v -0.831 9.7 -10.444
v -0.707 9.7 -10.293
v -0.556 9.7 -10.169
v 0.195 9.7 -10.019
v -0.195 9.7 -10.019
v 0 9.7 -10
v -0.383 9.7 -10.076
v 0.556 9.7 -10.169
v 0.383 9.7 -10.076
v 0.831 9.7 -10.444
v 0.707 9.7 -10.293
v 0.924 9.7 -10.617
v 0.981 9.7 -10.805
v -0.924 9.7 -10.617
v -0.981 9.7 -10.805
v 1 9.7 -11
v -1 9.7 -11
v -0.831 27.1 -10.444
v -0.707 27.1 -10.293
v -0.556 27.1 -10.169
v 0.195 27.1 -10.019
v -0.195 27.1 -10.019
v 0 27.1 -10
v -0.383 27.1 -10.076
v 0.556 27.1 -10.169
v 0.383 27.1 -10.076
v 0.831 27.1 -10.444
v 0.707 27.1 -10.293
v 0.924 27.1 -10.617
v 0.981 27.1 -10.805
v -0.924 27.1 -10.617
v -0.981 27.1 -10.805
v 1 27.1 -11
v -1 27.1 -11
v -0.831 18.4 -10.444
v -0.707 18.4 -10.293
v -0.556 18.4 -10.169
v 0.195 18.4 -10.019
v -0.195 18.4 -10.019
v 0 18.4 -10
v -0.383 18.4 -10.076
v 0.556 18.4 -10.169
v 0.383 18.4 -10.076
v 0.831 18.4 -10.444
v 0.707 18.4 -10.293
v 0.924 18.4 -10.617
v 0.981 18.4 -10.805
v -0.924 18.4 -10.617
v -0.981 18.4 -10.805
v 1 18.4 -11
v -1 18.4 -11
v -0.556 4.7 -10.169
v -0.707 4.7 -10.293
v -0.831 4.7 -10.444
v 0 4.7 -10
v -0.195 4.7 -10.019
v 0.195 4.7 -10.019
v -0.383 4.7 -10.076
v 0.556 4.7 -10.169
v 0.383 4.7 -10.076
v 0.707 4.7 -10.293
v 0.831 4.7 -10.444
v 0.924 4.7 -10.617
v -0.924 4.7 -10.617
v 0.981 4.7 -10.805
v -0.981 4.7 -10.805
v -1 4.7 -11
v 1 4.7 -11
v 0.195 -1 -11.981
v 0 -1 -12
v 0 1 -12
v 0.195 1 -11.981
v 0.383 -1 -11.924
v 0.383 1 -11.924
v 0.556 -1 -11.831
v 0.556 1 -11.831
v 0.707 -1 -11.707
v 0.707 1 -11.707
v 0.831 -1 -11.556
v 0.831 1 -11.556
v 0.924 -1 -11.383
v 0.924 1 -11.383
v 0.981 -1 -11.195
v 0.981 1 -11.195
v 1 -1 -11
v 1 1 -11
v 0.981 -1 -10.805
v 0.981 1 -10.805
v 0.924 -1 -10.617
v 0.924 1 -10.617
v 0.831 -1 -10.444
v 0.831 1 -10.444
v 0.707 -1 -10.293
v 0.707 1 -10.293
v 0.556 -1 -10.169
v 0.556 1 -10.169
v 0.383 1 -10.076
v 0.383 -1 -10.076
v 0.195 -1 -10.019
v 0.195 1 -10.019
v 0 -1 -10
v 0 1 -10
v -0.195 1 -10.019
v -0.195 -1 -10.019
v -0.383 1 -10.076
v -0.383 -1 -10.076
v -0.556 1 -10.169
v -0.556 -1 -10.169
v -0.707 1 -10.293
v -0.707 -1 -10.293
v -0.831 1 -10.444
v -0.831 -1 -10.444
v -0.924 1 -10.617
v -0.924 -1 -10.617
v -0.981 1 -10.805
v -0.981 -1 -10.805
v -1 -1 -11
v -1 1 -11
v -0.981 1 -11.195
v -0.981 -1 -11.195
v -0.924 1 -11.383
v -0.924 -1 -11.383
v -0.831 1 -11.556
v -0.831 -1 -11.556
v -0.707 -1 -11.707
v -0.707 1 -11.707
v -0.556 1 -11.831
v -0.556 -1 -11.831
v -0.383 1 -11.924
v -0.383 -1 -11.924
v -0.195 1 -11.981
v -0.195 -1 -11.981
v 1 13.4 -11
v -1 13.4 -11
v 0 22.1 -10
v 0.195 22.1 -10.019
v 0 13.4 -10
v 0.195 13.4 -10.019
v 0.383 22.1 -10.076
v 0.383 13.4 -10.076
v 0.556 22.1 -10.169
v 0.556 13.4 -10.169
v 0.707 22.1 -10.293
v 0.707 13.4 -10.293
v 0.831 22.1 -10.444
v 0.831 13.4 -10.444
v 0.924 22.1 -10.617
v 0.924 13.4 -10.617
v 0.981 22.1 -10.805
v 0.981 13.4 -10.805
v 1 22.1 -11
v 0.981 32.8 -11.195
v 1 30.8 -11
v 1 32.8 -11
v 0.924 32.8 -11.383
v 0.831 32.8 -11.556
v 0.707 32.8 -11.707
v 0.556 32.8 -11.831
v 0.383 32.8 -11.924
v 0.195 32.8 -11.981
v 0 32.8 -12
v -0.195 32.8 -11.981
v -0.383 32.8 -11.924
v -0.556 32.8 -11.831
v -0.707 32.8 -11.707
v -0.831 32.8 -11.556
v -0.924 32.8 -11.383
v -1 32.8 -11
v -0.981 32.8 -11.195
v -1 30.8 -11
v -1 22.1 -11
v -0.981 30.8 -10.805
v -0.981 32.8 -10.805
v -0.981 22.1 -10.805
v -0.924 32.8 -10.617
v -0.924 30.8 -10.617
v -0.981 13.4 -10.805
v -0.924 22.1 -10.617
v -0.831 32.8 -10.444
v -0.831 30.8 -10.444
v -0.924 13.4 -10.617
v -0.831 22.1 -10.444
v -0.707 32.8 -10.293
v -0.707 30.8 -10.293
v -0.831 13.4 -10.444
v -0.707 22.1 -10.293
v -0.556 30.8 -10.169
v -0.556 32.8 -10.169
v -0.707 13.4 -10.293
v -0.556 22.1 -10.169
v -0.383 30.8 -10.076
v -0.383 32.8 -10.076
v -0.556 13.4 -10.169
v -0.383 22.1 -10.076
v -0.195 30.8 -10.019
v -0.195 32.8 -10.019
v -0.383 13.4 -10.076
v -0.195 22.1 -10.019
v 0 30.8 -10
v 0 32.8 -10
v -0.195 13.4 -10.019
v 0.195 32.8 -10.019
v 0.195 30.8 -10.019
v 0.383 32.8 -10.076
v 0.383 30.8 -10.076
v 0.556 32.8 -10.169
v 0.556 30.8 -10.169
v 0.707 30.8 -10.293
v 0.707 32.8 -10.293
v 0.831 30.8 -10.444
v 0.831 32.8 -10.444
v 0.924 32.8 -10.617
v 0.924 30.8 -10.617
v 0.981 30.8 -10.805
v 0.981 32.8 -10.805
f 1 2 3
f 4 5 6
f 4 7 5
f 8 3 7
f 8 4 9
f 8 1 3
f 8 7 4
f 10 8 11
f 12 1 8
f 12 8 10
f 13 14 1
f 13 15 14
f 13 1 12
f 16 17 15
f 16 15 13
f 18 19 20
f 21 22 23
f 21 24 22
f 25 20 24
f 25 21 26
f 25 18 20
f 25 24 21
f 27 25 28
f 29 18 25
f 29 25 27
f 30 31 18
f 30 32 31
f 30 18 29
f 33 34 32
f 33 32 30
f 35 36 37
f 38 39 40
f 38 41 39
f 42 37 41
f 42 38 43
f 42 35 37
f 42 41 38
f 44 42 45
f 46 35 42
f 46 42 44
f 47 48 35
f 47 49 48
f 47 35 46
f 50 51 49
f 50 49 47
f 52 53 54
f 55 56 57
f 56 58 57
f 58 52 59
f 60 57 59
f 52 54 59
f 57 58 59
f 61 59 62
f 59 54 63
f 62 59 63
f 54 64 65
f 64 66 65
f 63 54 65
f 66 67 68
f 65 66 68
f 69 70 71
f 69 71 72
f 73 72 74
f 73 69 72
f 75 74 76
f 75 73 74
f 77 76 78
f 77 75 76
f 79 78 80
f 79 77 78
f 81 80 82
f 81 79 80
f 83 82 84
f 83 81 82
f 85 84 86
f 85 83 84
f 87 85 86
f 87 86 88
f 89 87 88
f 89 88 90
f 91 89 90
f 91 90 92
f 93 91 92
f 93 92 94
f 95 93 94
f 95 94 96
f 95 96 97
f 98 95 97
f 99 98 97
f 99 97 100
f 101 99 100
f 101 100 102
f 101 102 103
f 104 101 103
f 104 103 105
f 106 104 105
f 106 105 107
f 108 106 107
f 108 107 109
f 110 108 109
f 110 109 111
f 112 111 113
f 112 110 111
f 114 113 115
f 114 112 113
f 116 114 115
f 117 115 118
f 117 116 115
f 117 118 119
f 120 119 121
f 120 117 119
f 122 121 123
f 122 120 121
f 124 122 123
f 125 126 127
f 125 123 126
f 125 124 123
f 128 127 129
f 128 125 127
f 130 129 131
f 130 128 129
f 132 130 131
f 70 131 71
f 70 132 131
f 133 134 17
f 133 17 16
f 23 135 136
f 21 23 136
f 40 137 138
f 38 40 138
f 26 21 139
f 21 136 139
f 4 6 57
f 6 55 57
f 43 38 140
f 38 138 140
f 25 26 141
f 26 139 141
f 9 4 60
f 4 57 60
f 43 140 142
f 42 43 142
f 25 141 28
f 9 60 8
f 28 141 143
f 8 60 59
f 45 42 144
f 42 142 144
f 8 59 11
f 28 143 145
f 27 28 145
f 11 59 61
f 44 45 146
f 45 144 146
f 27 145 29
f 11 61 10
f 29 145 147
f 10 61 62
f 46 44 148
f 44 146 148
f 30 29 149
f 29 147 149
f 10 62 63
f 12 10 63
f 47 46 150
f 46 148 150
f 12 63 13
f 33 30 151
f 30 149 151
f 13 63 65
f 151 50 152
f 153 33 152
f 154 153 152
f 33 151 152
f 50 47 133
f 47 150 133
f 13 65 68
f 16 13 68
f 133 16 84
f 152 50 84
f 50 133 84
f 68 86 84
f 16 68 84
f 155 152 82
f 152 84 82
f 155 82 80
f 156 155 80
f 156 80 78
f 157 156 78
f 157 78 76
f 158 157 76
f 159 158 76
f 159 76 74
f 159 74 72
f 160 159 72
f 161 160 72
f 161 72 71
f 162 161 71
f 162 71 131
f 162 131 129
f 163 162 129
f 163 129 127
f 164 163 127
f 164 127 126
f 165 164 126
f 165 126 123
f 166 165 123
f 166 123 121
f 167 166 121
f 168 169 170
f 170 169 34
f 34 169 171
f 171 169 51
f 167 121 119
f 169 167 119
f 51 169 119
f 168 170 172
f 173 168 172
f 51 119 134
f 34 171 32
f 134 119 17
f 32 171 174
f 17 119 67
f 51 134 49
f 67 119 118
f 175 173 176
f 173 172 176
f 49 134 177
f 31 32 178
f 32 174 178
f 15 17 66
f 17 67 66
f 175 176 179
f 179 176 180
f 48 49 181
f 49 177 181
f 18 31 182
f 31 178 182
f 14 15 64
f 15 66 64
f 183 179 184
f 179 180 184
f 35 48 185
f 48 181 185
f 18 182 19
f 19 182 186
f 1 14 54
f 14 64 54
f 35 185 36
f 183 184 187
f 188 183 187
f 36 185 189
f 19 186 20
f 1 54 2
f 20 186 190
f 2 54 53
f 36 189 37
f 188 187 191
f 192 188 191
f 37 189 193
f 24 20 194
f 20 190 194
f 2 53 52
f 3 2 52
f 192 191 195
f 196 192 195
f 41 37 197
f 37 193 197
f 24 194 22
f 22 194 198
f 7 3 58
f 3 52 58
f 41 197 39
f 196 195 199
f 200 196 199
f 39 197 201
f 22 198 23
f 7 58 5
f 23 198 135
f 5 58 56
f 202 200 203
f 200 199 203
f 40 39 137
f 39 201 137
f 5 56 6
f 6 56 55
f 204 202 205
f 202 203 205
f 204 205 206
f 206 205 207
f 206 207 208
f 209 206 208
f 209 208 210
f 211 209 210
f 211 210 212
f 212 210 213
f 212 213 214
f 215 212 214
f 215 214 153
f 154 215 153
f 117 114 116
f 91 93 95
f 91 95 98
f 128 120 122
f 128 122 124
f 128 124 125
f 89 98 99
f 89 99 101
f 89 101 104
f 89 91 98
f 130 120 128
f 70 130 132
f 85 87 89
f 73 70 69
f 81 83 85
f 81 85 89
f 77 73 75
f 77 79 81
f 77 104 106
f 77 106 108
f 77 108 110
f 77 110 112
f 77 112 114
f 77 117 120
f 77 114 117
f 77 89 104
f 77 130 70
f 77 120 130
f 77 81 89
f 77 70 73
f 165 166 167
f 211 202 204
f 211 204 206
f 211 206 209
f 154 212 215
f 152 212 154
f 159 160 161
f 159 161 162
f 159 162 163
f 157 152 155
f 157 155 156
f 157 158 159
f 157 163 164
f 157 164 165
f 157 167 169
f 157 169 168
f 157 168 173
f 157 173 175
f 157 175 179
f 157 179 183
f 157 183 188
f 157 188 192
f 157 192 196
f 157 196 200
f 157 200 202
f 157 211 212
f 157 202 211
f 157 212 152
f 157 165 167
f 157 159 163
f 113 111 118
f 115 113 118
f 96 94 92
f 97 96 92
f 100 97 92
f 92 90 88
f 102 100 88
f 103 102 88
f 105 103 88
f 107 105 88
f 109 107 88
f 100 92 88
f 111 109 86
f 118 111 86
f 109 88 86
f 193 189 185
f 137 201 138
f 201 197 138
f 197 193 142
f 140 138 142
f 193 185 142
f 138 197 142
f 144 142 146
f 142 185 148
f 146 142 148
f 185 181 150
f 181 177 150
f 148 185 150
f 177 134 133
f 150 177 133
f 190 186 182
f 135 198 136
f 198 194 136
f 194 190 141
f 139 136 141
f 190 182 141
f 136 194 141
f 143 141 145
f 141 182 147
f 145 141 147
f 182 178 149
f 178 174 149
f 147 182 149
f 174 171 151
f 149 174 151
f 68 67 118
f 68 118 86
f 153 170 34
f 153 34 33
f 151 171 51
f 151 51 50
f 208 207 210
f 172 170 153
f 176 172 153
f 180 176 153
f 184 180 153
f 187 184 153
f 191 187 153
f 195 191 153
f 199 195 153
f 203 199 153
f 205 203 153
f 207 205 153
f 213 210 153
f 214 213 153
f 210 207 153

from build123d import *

# Parameters (mm, degrees)
SKETCH1_R           = 13
BOSS_EXTRUDE1_DEPTH = 1
SKETCH16_R          = 13
BOSS_EXTRUDE3_DEPTH = 1
SKETCH19_R          = 1
BOSS_EXTRUDE4_DEPTH = 29.8
SKETCH18_W          = 22
SKETCH18_H          = 22
CUT_EXTRUDE6_DEPTH  = 3.7
SKETCH21_W          = 22
SKETCH21_H          = 22
CUT_EXTRUDE7_DEPTH  = 3.7
SKETCH22_W          = 22
SKETCH22_H          = 22
CUT_EXTRUDE8_DEPTH  = 3.7
SKETCH23_W          = 22
SKETCH23_H          = 22
CUT_EXTRUDE9_DEPTH  = 3.7
SKETCH24_R          = 19.921792127
CUT_EXTRUDE10_DEPTH = 1
SKETCH25_R          = 36.182885583
CUT_EXTRUDE11_DEPTH = 1
SKETCH26_R          = 1
BOSS_EXTRUDE5_DEPTH = 2
BOSS_EXTRUDE6_START = 2
SKETCH27_R          = 1
BOSS_EXTRUDE6_DEPTH = 2


with BuildPart() as part:
    # Sketch1 → Boss-Extrude1 (new body)
    with BuildSketch(Plane(origin=(0, 0, 0), x_dir=(1, 0, 0), z_dir=(0, 1, 0))):
        with Locations(Location((0, 0, 0), (0, 0, 270))):
            Circle(SKETCH1_R)
    extrude(amount=BOSS_EXTRUDE1_DEPTH)



with BuildPart() as body_2:
    # Sketch16 → Boss-Extrude3 (new body)
    with BuildSketch(Plane(origin=(0, 30.8, 0), x_dir=(1, 0, 0), z_dir=(0, 1, 0))):
        with Locations(Location((0, 0, 0), (0, 0, 270))):
            Circle(SKETCH16_R)
    extrude(amount=BOSS_EXTRUDE3_DEPTH)


with BuildPart() as part_1:
    add(part.part)

    add(body_2.part)  # Boss-Extrude4 merges body 2
    # Sketch19 → Boss-Extrude4 (add)
    with BuildSketch(Plane(origin=(0, 1, 0), x_dir=(1, 0, 0), z_dir=(0, 1, 0))):
        with Locations(Location((0, 11, 0), (0, 0, 270))):
            Circle(SKETCH19_R)
    extrude(amount=BOSS_EXTRUDE4_DEPTH)

    # Sketch18 → Cut-Extrude6 (cut)
    with BuildSketch(Plane(origin=(0, 4.7, 0), x_dir=(1, 0, 0), z_dir=(0, 1, 0))):
        Rectangle(SKETCH18_W, SKETCH18_H)
    extrude(amount=-CUT_EXTRUDE6_DEPTH, mode=Mode.SUBTRACT)

    # Sketch21 → Cut-Extrude7 (cut)
    with BuildSketch(Plane(origin=(0, 13.4, 0), x_dir=(1, 0, 0), z_dir=(0, 1, 0))):
        Rectangle(SKETCH21_W, SKETCH21_H)
    extrude(amount=-CUT_EXTRUDE7_DEPTH, mode=Mode.SUBTRACT)

    # Sketch22 → Cut-Extrude8 (cut)
    with BuildSketch(Plane(origin=(0, 22.1, 0), x_dir=(1, 0, 0), z_dir=(0, 1, 0))):
        Rectangle(SKETCH22_W, SKETCH22_H)
    extrude(amount=-CUT_EXTRUDE8_DEPTH, mode=Mode.SUBTRACT)

    # Sketch23 → Cut-Extrude9 (cut)
    with BuildSketch(Plane(origin=(0, 30.8, 0), x_dir=(1, 0, 0), z_dir=(0, 1, 0))):
        Rectangle(SKETCH23_W, SKETCH23_H)
    extrude(amount=-CUT_EXTRUDE9_DEPTH, mode=Mode.SUBTRACT)

    # Sketch24 → Cut-Extrude10 (cut)
    with BuildSketch(Plane(origin=(0, 31.8, 0), x_dir=(1, 0, 0), z_dir=(0, 1, 0))):
        Circle(SKETCH24_R)
    extrude(amount=-CUT_EXTRUDE10_DEPTH, mode=Mode.SUBTRACT)

    # Sketch25 → Cut-Extrude11 (cut)
    with BuildSketch(Plane(origin=(0, 1, 0), x_dir=(1, 0, 0), z_dir=(0, 1, 0))):
        Circle(SKETCH25_R)
    extrude(amount=-CUT_EXTRUDE11_DEPTH, mode=Mode.SUBTRACT)

    # Sketch26 → Boss-Extrude5 (add)
    with BuildSketch(Plane(origin=(0, 30.8, 0), x_dir=(1, 0, 0), z_dir=(0, 1, 0))):
        with Locations((0, 11)):
            Circle(SKETCH26_R)
    extrude(amount=BOSS_EXTRUDE5_DEPTH)

    # Sketch27 → Boss-Extrude6 (add)
    with BuildSketch(Plane.XZ.offset(-1).offset(BOSS_EXTRUDE6_START)):
        with Locations(Location((0, -11, 0), (0, 0, 270))):
            Circle(SKETCH27_R)
    extrude(amount=-BOSS_EXTRUDE6_DEPTH)


solid = part_1.part
